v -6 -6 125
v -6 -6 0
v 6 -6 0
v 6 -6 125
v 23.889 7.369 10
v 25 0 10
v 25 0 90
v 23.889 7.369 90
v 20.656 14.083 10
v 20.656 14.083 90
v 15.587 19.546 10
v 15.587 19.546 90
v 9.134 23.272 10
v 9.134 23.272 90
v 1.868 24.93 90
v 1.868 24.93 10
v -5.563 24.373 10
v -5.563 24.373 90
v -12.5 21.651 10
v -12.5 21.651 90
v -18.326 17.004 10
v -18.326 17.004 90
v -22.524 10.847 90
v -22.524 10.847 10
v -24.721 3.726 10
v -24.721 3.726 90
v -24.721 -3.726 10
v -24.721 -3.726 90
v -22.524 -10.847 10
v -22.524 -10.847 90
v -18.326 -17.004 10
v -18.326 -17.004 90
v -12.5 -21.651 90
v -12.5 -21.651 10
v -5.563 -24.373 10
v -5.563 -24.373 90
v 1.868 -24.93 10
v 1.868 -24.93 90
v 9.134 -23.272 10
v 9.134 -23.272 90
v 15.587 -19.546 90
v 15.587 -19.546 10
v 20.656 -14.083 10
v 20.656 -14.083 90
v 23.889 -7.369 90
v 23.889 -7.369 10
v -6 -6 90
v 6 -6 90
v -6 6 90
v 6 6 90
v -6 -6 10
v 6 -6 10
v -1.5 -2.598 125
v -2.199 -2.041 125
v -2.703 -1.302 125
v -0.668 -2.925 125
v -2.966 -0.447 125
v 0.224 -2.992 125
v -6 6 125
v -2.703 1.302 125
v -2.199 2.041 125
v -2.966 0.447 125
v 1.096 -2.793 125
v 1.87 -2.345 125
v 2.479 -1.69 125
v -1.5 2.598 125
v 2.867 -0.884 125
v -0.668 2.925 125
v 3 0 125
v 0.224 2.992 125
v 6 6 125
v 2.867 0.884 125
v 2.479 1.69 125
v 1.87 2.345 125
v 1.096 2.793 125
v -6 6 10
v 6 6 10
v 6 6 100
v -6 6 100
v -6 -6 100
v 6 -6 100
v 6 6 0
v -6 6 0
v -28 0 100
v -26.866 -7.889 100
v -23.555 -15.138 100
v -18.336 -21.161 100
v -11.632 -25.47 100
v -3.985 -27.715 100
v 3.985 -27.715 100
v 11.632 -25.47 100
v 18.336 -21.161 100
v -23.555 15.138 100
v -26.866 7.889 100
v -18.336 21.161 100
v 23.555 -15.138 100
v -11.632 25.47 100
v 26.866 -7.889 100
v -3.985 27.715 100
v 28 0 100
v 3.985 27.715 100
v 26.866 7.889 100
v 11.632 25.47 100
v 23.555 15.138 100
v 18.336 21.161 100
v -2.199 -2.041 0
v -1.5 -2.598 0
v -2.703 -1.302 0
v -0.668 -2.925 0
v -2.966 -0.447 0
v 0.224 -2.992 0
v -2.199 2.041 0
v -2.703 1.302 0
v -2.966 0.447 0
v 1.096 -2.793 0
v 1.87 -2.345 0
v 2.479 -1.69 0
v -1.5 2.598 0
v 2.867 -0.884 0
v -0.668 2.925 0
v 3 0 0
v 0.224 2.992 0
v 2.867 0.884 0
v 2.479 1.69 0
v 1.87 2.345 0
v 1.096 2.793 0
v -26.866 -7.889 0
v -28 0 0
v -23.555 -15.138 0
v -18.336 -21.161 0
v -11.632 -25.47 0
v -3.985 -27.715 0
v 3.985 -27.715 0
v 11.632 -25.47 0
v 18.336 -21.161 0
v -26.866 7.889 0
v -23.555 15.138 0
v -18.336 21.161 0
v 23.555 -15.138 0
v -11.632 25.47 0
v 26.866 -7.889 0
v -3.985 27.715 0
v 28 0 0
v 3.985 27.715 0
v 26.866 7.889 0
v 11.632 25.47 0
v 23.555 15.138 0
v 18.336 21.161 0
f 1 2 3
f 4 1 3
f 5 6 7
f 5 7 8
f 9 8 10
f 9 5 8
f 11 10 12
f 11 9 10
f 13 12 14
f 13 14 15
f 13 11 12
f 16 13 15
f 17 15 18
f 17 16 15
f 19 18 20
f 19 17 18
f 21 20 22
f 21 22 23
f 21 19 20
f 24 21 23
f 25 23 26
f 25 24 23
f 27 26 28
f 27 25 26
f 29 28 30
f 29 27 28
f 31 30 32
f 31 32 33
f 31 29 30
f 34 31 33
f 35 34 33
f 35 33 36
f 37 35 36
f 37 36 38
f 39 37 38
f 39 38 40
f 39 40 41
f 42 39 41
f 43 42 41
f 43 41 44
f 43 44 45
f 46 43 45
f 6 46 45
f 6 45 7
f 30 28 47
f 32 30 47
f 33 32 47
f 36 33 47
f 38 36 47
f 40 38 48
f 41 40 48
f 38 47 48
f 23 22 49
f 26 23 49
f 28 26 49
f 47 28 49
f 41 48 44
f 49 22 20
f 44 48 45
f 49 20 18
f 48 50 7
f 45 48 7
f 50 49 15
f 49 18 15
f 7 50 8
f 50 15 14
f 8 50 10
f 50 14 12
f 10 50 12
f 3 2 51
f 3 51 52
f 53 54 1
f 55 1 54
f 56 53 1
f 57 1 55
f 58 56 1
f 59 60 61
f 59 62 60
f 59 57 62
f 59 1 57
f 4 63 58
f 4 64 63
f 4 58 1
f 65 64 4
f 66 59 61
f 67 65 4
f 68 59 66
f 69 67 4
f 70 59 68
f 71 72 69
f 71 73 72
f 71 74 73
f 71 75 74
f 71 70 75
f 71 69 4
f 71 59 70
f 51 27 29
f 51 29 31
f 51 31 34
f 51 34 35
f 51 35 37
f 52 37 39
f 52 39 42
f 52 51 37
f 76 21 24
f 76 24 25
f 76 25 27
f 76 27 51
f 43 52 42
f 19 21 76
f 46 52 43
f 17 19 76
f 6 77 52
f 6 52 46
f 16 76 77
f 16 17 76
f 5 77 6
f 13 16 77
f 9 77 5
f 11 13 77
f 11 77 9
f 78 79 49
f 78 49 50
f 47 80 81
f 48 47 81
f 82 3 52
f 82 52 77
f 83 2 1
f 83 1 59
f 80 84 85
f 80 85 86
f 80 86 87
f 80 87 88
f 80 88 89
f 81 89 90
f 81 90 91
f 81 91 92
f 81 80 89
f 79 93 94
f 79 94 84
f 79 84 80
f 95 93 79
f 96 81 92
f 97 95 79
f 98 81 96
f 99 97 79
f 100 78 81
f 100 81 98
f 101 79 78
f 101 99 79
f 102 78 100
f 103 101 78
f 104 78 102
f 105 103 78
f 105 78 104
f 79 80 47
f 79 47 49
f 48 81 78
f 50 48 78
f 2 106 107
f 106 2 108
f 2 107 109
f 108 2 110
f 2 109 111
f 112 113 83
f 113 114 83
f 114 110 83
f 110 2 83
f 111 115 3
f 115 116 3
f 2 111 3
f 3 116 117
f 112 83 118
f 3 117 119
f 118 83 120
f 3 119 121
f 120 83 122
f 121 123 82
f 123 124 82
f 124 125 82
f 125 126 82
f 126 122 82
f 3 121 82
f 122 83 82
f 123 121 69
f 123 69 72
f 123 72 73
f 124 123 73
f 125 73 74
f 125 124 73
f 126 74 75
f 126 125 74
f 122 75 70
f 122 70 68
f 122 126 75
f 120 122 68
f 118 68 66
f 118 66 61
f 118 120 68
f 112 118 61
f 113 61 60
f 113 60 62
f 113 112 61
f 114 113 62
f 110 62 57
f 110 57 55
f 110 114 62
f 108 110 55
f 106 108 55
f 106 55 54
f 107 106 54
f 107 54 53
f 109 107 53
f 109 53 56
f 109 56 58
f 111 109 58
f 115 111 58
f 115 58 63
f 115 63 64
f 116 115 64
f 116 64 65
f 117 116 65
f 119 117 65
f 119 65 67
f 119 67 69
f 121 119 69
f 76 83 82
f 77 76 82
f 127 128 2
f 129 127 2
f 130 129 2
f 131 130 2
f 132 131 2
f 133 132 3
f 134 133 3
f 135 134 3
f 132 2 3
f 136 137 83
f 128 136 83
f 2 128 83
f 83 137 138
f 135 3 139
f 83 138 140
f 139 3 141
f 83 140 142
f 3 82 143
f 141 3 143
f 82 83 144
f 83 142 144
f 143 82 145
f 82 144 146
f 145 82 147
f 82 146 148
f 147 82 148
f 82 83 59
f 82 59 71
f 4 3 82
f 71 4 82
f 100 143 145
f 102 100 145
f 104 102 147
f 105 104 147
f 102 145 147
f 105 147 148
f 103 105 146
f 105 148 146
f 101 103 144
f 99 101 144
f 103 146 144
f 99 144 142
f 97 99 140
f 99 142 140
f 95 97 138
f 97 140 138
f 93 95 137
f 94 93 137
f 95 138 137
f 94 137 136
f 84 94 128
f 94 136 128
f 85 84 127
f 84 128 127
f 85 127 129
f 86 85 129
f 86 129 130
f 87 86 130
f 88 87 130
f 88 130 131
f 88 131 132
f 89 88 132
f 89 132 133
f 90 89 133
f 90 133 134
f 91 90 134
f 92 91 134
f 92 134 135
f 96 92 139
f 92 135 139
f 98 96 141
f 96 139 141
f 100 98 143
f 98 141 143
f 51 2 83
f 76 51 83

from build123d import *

# Parameters (mm, degrees)
F0_R     = 28
F0_R_2   = 25
F1_DEPTH = 100
F0_W     = 12
F0_H     = 12
F2_DEPTH = 10
F3_R     = 25
F3_W     = 12
F3_H     = 12
F4_DEPTH = 10
F0_R_3   = 3
F5_DEPTH = 10
F6_DEPTH = 125


with BuildPart() as f1:
    # F0 (on Top) → F1 (new body)
    with BuildSketch(Plane.XY):
        Circle(F0_R)
        Circle(F0_R_2, mode=Mode.SUBTRACT)
    extrude(amount=F1_DEPTH)

    # F0 (on Top) → F2 (join)
    with BuildSketch(Plane.XY):
        Circle(F0_R_2)
        Rectangle(F0_W, F0_H, mode=Mode.SUBTRACT)
    extrude(amount=F2_DEPTH)

    # F3 (on face) → F4 (join)
    with BuildSketch(Plane.XY.offset(100)):
        Circle(F3_R)
        Rectangle(F3_W, F3_H, mode=Mode.SUBTRACT)
    extrude(amount=-F4_DEPTH)


with BuildPart() as f5:
    # F0 (on Top) → F5 (new body)
    with BuildSketch(Plane.XY):
        Rectangle(F0_W, F0_H)
        Circle(F0_R_3, mode=Mode.SUBTRACT)
    extrude(amount=F5_DEPTH)

    # F0 (on Top) → F6 (join)
    with BuildSketch(Plane.XY):
        Rectangle(F0_W, F0_H)
        Circle(F0_R_3, mode=Mode.SUBTRACT)
    extrude(amount=F6_DEPTH)


solid = Compound([f1.part, f5.part])
